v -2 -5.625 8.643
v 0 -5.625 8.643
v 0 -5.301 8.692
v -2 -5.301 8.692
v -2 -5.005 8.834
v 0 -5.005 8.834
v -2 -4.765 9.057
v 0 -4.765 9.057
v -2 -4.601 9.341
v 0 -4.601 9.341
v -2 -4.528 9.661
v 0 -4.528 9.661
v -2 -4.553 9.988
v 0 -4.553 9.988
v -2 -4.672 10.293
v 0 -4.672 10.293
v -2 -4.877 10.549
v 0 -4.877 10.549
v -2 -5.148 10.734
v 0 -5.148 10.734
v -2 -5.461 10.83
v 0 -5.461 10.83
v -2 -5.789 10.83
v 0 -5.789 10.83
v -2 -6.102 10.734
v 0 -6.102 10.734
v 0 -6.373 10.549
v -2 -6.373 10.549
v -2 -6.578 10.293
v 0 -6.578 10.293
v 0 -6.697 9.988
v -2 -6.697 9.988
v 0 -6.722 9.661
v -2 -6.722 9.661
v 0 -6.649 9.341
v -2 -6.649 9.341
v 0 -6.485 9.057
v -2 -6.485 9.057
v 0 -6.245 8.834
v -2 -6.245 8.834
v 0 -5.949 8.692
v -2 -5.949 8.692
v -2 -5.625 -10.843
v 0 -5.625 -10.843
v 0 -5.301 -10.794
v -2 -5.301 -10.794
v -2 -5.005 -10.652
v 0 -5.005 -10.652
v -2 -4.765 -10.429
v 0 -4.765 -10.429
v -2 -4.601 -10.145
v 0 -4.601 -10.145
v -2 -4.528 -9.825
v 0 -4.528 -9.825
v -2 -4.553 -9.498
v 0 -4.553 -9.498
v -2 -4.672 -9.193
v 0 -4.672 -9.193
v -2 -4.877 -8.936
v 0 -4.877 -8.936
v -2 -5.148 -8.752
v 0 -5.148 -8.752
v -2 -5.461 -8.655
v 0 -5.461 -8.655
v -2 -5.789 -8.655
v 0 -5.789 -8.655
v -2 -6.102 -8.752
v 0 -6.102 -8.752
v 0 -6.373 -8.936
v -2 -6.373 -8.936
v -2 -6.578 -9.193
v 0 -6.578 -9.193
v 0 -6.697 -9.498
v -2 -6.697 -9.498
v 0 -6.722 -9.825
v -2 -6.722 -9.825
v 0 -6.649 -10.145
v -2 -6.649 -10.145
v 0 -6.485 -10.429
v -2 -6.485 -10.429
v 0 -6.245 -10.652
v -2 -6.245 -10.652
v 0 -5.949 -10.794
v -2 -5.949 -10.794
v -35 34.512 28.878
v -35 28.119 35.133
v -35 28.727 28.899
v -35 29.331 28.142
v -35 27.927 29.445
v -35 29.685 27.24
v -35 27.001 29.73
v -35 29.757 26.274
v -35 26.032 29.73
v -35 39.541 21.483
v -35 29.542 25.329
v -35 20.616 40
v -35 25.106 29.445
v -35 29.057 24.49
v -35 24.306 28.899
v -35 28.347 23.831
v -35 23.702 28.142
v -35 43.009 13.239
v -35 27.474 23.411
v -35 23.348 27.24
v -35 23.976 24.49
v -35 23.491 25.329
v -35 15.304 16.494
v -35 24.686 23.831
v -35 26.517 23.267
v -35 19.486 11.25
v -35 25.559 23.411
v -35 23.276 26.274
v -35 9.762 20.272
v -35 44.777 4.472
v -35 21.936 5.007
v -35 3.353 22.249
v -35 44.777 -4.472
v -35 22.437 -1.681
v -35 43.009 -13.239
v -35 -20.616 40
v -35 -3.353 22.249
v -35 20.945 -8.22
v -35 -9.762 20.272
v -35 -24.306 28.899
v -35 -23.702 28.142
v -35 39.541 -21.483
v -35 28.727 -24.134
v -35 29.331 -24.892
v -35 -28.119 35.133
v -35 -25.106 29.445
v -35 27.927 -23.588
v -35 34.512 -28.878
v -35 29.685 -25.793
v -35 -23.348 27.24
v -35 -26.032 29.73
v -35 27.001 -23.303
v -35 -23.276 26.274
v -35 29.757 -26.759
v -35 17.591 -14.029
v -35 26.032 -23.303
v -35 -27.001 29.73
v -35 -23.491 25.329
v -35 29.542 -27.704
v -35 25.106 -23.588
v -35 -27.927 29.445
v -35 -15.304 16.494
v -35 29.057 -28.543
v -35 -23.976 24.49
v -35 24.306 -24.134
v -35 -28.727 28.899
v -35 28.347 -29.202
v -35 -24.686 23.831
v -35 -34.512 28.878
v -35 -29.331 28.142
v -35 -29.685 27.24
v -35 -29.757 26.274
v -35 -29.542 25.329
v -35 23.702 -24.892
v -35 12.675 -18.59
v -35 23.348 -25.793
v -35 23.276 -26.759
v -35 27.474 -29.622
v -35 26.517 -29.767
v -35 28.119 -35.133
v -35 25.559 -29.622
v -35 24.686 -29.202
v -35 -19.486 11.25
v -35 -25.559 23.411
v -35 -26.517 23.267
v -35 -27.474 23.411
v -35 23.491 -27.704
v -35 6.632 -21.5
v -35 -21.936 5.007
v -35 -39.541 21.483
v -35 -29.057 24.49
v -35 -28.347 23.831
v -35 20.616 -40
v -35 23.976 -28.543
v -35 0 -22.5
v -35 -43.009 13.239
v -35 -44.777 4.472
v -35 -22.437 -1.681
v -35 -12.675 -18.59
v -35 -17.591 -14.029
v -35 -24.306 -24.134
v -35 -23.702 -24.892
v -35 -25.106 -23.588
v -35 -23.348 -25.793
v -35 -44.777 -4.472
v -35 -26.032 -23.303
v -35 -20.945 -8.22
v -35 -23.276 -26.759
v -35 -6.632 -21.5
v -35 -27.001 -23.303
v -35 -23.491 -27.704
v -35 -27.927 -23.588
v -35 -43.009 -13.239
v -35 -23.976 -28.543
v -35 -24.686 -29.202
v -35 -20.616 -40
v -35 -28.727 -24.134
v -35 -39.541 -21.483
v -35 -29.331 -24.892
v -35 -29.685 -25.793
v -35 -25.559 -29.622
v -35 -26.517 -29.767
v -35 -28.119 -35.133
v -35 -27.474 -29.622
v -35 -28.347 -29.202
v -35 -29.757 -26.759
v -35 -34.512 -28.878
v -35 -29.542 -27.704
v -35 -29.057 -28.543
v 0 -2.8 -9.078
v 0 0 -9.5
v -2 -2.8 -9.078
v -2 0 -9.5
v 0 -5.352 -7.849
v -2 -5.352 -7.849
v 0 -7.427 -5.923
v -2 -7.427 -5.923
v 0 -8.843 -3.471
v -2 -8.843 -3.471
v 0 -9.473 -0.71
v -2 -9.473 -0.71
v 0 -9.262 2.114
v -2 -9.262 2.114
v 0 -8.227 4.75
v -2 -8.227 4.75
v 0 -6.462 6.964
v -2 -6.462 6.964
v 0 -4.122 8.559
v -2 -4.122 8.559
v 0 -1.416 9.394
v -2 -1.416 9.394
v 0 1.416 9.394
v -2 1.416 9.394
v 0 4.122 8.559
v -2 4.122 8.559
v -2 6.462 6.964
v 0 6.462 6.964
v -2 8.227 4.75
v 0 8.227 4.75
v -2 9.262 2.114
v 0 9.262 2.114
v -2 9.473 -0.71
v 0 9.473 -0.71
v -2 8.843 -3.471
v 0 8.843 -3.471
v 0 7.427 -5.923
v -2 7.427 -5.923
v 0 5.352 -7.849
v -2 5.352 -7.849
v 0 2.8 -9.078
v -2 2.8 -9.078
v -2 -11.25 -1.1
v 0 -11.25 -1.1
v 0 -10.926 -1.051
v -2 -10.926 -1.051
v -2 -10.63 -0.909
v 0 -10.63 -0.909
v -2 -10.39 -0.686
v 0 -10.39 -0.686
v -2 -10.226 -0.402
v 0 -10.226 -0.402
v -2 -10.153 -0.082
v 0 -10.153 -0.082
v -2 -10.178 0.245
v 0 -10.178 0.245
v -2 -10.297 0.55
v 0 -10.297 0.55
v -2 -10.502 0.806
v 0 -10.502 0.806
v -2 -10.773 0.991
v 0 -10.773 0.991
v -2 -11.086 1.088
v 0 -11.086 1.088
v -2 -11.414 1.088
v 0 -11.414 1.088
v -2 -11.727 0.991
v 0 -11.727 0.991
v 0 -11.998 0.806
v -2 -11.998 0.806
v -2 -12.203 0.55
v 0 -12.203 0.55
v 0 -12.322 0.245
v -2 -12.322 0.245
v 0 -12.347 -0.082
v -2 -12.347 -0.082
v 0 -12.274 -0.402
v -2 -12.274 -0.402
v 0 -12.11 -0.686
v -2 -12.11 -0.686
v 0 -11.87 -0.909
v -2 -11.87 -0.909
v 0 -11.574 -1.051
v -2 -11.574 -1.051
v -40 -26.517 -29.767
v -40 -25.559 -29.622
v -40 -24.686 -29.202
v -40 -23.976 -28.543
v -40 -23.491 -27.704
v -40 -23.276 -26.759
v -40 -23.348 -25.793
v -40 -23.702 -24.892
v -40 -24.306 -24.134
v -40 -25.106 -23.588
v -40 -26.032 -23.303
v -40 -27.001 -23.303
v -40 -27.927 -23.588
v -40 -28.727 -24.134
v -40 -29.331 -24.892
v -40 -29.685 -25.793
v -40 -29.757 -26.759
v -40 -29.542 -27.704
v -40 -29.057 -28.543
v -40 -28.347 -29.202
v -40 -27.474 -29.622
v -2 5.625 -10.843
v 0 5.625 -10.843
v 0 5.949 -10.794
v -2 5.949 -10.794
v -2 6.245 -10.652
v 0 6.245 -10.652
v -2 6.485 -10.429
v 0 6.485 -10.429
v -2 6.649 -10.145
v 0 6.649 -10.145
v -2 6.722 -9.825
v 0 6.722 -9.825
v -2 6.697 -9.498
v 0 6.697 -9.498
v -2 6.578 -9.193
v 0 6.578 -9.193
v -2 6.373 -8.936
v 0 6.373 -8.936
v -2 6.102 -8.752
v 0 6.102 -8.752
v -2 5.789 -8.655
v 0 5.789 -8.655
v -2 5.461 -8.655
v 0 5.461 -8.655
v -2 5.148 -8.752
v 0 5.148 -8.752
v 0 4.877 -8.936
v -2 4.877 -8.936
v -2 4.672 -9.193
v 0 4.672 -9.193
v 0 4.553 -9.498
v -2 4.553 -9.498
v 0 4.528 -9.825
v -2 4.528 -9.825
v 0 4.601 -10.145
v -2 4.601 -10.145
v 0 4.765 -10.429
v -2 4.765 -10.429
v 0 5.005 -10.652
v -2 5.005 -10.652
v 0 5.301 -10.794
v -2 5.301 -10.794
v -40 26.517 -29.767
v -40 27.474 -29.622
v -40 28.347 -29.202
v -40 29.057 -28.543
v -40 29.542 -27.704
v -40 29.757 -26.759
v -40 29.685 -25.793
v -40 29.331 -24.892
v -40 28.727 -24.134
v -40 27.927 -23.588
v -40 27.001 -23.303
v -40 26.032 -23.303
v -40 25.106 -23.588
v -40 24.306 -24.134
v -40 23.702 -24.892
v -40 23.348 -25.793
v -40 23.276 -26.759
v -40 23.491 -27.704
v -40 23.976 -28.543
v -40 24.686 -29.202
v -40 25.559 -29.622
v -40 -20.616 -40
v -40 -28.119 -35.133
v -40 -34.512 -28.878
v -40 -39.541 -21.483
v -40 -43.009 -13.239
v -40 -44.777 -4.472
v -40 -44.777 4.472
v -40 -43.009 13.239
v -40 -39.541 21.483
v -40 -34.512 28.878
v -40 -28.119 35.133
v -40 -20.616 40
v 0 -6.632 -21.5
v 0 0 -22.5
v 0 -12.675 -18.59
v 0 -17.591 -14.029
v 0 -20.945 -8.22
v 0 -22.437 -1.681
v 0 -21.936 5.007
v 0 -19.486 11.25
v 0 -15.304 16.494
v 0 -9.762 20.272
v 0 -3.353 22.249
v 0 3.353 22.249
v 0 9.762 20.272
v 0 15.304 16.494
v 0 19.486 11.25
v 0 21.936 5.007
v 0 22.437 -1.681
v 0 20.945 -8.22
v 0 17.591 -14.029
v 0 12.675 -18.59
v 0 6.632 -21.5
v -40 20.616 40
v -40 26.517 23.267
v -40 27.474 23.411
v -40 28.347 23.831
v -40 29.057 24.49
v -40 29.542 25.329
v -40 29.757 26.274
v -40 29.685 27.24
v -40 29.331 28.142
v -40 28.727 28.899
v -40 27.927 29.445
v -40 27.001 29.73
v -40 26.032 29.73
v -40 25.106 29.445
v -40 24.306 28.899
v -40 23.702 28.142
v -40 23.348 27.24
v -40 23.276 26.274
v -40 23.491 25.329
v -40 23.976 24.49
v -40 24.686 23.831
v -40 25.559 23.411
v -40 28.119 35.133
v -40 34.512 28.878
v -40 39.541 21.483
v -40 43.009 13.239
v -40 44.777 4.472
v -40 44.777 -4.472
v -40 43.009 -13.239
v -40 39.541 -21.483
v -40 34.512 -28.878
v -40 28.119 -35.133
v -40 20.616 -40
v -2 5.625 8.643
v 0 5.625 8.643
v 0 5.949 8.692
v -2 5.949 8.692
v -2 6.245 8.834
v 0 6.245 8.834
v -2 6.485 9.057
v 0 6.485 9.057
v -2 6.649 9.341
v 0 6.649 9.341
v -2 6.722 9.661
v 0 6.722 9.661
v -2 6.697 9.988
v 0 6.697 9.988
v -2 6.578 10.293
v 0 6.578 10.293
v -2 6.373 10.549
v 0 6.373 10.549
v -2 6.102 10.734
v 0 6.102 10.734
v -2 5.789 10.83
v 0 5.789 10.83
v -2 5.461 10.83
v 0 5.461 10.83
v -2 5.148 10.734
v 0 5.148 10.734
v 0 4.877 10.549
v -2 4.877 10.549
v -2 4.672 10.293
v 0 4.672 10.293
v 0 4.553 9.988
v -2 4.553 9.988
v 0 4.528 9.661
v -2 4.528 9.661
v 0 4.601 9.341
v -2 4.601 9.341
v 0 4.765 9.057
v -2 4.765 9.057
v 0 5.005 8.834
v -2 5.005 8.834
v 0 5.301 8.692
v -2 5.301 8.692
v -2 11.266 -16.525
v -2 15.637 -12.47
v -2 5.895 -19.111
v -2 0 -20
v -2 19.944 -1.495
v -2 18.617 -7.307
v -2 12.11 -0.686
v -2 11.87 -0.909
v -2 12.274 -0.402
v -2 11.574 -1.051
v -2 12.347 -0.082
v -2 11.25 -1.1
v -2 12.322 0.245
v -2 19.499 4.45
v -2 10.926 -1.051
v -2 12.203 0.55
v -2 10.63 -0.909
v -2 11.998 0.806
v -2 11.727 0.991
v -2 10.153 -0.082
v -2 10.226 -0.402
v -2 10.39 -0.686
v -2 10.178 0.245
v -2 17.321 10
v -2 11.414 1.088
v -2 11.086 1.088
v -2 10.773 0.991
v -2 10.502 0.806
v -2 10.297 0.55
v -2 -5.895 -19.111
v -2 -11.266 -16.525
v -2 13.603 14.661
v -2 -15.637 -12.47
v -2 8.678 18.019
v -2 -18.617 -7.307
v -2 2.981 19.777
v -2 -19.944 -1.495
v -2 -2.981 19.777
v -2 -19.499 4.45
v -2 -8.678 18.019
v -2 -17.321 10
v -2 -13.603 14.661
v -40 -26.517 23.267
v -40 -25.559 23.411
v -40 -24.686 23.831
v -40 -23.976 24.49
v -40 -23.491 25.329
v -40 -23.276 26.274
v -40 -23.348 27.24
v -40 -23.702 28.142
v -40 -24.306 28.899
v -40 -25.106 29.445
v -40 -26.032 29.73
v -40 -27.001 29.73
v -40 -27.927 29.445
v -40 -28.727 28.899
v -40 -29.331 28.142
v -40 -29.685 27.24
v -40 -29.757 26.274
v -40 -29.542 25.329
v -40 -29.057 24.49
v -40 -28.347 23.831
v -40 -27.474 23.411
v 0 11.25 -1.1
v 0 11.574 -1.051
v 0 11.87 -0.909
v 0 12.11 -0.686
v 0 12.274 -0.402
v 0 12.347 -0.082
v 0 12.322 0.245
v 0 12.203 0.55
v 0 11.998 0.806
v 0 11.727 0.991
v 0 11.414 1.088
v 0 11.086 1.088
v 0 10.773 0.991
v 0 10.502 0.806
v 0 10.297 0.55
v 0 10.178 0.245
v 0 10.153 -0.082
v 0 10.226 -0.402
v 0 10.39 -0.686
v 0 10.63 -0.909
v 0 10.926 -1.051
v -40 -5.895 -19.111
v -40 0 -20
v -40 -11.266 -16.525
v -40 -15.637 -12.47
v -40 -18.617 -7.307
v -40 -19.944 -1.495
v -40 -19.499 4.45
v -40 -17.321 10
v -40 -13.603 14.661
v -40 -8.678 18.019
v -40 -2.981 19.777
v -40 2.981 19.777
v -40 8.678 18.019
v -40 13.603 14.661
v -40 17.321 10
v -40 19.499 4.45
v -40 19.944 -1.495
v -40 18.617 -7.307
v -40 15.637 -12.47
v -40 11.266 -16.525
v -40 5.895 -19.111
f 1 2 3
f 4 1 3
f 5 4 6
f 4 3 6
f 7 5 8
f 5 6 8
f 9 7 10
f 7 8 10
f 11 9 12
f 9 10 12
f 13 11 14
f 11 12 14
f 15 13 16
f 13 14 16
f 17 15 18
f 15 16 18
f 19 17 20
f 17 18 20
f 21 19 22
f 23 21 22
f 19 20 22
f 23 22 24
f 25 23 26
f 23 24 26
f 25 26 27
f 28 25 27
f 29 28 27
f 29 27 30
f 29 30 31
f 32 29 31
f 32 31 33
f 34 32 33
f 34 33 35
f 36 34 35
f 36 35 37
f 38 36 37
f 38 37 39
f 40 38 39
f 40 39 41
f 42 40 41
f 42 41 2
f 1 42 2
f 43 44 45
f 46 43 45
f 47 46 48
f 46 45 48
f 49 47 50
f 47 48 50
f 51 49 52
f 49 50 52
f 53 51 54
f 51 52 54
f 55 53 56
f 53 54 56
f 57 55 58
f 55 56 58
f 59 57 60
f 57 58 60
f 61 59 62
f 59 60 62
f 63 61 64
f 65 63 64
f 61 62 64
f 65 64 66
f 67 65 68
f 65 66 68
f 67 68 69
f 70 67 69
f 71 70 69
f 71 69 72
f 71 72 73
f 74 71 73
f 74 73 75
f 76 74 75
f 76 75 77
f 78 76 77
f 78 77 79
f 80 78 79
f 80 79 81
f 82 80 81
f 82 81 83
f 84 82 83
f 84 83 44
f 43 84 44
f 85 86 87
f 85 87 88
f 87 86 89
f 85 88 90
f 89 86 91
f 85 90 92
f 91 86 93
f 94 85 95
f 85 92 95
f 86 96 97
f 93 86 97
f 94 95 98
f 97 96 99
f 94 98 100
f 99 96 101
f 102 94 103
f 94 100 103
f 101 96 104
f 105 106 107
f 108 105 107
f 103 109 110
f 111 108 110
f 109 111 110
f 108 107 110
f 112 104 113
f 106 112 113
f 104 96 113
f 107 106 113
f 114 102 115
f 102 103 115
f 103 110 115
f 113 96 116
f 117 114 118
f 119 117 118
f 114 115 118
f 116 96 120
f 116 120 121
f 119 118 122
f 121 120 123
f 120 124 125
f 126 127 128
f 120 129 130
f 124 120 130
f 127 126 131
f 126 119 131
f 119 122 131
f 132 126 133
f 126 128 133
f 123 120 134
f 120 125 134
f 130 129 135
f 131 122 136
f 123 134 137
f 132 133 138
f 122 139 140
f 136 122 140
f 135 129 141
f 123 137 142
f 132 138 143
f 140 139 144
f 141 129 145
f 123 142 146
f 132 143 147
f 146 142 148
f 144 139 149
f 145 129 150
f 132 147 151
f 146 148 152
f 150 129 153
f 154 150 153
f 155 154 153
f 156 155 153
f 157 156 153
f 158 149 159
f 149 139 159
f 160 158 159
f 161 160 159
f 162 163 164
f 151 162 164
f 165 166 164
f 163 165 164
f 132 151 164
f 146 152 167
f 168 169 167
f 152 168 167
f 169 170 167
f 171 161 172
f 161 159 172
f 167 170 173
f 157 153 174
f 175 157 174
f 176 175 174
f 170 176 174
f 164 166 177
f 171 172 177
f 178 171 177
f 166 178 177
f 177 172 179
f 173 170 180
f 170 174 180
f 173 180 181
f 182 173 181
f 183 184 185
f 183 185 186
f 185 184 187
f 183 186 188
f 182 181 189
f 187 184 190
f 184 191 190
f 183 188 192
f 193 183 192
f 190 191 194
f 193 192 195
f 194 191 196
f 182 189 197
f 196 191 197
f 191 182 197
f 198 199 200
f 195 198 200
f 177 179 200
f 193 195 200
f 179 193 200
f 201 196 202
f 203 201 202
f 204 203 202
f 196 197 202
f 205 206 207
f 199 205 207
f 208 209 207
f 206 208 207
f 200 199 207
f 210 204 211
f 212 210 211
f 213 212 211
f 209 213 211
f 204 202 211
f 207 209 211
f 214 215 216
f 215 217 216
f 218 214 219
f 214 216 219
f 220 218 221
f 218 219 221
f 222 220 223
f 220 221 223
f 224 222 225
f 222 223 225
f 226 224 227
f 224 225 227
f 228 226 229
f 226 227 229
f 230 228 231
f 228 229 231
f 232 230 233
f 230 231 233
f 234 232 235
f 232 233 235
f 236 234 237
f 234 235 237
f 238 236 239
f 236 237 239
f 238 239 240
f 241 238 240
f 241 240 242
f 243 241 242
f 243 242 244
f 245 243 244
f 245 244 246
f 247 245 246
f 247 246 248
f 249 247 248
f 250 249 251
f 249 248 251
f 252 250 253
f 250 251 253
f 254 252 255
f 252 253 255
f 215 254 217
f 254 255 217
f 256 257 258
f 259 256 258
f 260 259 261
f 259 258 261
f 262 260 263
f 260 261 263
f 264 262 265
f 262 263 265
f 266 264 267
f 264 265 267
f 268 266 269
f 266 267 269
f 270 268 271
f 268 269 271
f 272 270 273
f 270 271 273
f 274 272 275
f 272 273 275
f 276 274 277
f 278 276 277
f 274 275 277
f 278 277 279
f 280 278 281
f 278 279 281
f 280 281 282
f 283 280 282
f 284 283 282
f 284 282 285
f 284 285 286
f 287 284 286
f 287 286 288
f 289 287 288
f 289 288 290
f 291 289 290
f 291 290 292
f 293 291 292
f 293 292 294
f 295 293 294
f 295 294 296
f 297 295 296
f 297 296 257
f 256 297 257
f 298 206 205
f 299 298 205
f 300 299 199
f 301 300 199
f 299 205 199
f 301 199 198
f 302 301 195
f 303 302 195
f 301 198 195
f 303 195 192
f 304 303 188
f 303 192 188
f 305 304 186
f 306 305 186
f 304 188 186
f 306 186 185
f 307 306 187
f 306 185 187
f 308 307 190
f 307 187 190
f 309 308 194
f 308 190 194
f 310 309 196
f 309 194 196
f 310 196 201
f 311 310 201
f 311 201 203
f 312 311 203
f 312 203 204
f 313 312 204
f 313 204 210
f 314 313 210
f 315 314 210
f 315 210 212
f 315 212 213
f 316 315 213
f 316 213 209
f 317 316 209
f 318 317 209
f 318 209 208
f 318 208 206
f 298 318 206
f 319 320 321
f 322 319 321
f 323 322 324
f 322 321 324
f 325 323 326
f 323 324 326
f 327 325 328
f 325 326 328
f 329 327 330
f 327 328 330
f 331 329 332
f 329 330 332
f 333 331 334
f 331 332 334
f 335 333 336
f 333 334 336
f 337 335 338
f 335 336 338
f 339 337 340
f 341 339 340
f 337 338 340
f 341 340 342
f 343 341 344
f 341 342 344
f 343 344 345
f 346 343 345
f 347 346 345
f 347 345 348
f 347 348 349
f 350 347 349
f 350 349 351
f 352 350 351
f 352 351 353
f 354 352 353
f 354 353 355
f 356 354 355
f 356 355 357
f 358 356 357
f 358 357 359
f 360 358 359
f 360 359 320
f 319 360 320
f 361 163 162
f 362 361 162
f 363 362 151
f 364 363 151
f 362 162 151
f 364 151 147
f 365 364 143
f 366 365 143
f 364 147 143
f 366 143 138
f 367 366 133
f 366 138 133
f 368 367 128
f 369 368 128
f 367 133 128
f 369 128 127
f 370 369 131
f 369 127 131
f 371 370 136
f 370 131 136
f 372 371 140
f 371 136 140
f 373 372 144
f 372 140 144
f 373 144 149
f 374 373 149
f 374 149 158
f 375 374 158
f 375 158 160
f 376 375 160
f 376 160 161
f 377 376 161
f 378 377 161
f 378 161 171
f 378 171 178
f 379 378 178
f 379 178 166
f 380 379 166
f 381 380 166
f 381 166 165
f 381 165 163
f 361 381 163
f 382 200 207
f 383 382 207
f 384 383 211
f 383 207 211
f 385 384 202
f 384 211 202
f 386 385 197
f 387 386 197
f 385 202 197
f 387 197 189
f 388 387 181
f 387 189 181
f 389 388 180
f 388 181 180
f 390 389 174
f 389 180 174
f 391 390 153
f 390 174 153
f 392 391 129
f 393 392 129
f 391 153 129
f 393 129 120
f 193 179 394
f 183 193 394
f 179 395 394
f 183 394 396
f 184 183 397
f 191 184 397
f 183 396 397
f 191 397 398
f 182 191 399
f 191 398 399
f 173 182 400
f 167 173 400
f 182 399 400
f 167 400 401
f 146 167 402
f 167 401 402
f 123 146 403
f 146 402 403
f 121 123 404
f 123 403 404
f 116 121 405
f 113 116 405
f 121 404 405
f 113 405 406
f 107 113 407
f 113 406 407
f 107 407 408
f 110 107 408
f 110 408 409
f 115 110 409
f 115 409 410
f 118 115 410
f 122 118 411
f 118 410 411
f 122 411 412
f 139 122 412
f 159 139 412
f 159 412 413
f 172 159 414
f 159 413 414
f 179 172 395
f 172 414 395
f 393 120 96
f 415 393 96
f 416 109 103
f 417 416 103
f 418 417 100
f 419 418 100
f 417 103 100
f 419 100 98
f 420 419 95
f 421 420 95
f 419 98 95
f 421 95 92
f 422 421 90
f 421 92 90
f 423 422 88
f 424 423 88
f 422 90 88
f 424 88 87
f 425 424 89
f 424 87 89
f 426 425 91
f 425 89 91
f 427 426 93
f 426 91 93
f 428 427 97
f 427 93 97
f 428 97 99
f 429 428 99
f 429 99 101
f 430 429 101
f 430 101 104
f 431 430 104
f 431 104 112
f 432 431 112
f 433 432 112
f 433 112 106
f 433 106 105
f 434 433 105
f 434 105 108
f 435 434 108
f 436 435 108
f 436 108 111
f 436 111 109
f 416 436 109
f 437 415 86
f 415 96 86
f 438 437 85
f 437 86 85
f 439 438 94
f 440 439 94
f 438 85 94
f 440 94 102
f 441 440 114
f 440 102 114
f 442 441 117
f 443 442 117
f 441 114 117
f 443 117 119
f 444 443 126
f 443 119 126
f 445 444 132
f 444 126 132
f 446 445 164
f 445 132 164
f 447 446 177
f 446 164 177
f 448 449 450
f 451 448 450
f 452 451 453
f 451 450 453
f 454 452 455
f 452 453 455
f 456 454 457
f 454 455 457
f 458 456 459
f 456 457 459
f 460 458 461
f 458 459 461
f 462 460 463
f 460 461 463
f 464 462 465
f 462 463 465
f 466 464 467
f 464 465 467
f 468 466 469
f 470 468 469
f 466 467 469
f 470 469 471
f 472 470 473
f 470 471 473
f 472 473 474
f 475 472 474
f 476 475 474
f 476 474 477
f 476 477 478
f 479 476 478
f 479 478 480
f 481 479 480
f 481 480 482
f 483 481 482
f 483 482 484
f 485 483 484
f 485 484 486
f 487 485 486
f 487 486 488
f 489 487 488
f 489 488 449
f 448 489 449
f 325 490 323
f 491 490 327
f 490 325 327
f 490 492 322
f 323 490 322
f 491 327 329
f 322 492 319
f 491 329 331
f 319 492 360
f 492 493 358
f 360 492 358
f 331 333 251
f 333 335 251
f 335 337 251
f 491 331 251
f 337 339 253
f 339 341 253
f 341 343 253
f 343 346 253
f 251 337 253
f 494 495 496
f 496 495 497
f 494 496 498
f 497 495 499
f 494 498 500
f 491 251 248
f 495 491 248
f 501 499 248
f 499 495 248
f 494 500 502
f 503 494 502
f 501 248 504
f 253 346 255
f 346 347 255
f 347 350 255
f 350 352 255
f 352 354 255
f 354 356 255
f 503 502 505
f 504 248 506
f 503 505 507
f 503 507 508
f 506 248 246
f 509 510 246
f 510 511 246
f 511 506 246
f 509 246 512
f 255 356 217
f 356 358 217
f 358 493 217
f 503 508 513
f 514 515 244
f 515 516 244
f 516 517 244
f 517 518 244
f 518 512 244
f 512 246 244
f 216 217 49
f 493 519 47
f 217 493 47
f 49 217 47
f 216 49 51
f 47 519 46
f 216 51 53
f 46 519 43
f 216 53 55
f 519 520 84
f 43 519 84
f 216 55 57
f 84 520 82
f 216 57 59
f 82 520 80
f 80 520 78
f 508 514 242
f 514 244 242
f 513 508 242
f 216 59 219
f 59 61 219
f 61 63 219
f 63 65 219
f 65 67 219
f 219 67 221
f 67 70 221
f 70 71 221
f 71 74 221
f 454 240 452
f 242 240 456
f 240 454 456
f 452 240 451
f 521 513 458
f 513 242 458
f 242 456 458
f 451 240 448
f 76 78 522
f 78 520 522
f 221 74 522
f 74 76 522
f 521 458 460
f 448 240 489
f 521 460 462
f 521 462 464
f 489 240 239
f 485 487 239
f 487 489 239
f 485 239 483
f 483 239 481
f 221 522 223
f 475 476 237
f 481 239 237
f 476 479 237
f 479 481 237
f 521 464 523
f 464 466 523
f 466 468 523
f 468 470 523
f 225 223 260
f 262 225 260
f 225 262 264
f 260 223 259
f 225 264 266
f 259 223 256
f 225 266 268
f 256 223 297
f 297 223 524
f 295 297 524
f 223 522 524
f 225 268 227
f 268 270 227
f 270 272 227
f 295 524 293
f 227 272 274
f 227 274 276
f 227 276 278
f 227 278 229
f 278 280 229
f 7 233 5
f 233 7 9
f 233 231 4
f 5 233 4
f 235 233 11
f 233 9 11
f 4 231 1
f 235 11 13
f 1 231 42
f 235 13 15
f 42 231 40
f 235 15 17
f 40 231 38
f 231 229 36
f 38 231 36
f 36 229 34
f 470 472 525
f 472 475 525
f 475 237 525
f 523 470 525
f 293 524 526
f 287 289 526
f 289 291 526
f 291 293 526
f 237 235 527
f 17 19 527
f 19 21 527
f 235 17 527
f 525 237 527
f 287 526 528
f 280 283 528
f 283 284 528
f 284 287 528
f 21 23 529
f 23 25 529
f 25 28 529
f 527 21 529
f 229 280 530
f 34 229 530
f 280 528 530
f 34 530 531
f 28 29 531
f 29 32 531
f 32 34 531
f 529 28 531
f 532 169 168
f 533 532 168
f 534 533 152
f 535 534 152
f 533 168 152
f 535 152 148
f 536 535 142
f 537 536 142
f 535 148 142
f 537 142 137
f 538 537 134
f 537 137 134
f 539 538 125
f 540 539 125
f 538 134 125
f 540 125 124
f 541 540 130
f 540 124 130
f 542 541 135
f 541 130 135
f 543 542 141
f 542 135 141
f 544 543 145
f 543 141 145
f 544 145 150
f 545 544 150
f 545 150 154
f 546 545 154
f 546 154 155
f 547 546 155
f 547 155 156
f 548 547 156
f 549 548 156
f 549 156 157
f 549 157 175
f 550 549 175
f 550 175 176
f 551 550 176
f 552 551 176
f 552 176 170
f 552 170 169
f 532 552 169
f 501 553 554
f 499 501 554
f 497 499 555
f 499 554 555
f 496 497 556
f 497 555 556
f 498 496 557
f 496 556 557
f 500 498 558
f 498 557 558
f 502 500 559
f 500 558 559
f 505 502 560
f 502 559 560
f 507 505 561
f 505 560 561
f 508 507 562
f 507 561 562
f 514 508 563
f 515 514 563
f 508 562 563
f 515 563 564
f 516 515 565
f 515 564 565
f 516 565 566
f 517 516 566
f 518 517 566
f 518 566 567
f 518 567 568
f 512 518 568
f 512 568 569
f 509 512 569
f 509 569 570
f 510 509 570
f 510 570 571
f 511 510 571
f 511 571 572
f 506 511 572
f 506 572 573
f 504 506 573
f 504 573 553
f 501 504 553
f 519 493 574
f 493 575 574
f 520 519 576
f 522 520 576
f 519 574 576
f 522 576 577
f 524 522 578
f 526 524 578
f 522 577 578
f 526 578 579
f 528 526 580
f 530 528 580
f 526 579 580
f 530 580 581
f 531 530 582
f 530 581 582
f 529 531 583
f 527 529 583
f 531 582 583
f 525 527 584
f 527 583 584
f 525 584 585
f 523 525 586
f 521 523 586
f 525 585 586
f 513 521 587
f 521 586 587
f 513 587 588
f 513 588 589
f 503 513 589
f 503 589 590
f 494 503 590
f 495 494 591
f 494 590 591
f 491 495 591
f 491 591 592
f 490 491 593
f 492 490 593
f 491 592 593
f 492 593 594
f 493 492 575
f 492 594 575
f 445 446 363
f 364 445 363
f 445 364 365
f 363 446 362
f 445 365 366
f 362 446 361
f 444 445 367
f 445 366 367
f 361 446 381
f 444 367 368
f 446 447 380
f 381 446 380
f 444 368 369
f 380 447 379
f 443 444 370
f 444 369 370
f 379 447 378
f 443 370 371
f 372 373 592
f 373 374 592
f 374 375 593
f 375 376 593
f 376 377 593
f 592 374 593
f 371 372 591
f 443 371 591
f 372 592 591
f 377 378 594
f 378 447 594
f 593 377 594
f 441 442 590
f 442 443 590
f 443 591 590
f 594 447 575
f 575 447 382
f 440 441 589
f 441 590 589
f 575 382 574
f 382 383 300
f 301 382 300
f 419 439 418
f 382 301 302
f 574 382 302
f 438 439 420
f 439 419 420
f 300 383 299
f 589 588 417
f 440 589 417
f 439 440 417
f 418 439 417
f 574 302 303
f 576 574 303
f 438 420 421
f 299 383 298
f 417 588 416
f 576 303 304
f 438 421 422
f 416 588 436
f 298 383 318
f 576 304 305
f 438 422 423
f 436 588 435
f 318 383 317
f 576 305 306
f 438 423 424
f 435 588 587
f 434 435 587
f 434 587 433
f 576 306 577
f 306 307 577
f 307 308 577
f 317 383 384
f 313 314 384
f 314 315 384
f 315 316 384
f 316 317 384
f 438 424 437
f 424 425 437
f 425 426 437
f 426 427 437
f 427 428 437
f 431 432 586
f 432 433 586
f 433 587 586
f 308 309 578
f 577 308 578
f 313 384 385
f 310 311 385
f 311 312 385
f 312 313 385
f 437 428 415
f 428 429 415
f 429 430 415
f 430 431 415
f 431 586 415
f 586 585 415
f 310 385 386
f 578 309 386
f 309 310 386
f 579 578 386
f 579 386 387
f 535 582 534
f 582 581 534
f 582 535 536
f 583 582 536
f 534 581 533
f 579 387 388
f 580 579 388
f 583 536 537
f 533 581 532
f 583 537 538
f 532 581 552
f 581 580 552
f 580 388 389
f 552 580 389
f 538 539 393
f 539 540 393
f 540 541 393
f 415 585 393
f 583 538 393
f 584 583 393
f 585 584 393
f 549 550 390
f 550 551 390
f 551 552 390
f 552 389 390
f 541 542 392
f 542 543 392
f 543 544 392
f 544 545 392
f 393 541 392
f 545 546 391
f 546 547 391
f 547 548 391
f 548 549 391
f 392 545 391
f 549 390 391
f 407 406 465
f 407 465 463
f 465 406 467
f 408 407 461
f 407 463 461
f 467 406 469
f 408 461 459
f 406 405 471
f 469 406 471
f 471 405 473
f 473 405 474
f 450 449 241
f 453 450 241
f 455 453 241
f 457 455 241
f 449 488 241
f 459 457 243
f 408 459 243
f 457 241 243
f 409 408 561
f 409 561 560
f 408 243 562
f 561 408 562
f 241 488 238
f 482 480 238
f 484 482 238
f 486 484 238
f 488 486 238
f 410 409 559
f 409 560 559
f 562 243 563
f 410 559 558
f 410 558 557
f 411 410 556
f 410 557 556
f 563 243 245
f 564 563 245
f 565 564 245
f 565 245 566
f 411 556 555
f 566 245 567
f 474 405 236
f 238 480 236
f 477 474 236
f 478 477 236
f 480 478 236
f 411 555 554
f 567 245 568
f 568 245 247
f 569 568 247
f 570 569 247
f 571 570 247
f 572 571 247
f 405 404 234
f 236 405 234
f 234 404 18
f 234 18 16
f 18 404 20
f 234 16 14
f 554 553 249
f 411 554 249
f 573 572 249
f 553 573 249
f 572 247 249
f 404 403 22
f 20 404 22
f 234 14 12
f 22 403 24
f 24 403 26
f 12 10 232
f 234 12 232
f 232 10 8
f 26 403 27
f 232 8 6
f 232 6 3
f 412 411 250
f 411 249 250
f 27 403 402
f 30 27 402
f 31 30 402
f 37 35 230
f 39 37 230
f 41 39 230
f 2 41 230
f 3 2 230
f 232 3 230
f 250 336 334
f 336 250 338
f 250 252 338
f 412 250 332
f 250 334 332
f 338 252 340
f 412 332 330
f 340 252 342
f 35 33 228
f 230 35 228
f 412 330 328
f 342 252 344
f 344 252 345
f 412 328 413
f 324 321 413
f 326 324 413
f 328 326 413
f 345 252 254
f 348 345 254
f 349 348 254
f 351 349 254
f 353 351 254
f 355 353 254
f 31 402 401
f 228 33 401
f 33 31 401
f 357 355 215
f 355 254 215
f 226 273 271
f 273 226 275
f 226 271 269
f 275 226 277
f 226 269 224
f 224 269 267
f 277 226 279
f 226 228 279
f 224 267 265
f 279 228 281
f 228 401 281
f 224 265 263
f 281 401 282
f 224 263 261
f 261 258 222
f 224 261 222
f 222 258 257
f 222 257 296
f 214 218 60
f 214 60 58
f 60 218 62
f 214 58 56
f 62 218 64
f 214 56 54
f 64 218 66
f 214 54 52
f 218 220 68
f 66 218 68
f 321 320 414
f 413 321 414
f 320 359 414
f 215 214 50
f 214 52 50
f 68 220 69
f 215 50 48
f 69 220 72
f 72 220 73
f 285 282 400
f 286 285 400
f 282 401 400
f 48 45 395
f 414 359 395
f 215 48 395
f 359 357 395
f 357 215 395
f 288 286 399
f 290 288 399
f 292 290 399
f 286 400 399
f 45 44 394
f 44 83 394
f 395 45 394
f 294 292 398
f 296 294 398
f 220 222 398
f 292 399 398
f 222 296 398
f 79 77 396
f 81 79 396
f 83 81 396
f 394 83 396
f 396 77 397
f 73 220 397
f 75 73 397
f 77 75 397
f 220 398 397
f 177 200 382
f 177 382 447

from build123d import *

# Parameters (mm, degrees)
SZKIC2_R                   = 3.25
SZKIC2_R_2                 = 1.1
SZKIC2_W                   = 5
SZKIC2_H                   = 41.231056256
WYTNIJ_WYCI_GNI_CIE1_DEPTH = 76.166481892


with BuildPart() as part:
    # Szkic1 → Obrót1 (revolve)
    with BuildSketch(Plane.XY, mode=Mode.PRIVATE) as obr_t1_sk:
        Polygon((-2, 9.5), (-2, 20), (-40, 20), (-40, 45), (-35, 45), (-35, 22.5), (0, 22.5), (0, 9.5), align=None)
    revolve(obr_t1_sk.sketch.rotate(Axis((0, 0, 0), (-1, 0, 0)), 90), axis=Axis((0, 0, 0), (-1, 0, 0)))

    # Szkic2 → Wytnij-wyciągnięcie1 (cut, through all)
    with BuildSketch(Plane(origin=(0, 0, 0), x_dir=(0, 0, -1), z_dir=(1, 0, 0))):
        with Locations((26.516504294, 26.516504294)):
            Circle(SZKIC2_R)
        with Locations((26.516504294, -26.516504294)):
            Circle(SZKIC2_R)
        with Locations((-26.516504294, -26.516504294)):
            Circle(SZKIC2_R)
        with Locations((-26.516504294, 26.516504294)):
            Circle(SZKIC2_R)
        with Locations((0, 11.25)):
            Circle(SZKIC2_R_2)
        with Locations((9.742785793, 5.625)):
            Circle(SZKIC2_R_2)
        with Locations((9.742785793, -5.625)):
            Circle(SZKIC2_R_2)
        with Locations((0, -11.25)):
            Circle(SZKIC2_R_2)
        with Locations((-9.742785793, -5.625)):
            Circle(SZKIC2_R_2)
        with Locations((-9.742785793, 5.625)):
            Circle(SZKIC2_R_2)
        with Locations((-42.5, 0)):
            Rectangle(SZKIC2_W, SZKIC2_H)
        with Locations((42.5, 0)):
            Rectangle(SZKIC2_W, SZKIC2_H)
    extrude(amount=-WYTNIJ_WYCI_GNI_CIE1_DEPTH, mode=Mode.SUBTRACT)


solid = part.part
